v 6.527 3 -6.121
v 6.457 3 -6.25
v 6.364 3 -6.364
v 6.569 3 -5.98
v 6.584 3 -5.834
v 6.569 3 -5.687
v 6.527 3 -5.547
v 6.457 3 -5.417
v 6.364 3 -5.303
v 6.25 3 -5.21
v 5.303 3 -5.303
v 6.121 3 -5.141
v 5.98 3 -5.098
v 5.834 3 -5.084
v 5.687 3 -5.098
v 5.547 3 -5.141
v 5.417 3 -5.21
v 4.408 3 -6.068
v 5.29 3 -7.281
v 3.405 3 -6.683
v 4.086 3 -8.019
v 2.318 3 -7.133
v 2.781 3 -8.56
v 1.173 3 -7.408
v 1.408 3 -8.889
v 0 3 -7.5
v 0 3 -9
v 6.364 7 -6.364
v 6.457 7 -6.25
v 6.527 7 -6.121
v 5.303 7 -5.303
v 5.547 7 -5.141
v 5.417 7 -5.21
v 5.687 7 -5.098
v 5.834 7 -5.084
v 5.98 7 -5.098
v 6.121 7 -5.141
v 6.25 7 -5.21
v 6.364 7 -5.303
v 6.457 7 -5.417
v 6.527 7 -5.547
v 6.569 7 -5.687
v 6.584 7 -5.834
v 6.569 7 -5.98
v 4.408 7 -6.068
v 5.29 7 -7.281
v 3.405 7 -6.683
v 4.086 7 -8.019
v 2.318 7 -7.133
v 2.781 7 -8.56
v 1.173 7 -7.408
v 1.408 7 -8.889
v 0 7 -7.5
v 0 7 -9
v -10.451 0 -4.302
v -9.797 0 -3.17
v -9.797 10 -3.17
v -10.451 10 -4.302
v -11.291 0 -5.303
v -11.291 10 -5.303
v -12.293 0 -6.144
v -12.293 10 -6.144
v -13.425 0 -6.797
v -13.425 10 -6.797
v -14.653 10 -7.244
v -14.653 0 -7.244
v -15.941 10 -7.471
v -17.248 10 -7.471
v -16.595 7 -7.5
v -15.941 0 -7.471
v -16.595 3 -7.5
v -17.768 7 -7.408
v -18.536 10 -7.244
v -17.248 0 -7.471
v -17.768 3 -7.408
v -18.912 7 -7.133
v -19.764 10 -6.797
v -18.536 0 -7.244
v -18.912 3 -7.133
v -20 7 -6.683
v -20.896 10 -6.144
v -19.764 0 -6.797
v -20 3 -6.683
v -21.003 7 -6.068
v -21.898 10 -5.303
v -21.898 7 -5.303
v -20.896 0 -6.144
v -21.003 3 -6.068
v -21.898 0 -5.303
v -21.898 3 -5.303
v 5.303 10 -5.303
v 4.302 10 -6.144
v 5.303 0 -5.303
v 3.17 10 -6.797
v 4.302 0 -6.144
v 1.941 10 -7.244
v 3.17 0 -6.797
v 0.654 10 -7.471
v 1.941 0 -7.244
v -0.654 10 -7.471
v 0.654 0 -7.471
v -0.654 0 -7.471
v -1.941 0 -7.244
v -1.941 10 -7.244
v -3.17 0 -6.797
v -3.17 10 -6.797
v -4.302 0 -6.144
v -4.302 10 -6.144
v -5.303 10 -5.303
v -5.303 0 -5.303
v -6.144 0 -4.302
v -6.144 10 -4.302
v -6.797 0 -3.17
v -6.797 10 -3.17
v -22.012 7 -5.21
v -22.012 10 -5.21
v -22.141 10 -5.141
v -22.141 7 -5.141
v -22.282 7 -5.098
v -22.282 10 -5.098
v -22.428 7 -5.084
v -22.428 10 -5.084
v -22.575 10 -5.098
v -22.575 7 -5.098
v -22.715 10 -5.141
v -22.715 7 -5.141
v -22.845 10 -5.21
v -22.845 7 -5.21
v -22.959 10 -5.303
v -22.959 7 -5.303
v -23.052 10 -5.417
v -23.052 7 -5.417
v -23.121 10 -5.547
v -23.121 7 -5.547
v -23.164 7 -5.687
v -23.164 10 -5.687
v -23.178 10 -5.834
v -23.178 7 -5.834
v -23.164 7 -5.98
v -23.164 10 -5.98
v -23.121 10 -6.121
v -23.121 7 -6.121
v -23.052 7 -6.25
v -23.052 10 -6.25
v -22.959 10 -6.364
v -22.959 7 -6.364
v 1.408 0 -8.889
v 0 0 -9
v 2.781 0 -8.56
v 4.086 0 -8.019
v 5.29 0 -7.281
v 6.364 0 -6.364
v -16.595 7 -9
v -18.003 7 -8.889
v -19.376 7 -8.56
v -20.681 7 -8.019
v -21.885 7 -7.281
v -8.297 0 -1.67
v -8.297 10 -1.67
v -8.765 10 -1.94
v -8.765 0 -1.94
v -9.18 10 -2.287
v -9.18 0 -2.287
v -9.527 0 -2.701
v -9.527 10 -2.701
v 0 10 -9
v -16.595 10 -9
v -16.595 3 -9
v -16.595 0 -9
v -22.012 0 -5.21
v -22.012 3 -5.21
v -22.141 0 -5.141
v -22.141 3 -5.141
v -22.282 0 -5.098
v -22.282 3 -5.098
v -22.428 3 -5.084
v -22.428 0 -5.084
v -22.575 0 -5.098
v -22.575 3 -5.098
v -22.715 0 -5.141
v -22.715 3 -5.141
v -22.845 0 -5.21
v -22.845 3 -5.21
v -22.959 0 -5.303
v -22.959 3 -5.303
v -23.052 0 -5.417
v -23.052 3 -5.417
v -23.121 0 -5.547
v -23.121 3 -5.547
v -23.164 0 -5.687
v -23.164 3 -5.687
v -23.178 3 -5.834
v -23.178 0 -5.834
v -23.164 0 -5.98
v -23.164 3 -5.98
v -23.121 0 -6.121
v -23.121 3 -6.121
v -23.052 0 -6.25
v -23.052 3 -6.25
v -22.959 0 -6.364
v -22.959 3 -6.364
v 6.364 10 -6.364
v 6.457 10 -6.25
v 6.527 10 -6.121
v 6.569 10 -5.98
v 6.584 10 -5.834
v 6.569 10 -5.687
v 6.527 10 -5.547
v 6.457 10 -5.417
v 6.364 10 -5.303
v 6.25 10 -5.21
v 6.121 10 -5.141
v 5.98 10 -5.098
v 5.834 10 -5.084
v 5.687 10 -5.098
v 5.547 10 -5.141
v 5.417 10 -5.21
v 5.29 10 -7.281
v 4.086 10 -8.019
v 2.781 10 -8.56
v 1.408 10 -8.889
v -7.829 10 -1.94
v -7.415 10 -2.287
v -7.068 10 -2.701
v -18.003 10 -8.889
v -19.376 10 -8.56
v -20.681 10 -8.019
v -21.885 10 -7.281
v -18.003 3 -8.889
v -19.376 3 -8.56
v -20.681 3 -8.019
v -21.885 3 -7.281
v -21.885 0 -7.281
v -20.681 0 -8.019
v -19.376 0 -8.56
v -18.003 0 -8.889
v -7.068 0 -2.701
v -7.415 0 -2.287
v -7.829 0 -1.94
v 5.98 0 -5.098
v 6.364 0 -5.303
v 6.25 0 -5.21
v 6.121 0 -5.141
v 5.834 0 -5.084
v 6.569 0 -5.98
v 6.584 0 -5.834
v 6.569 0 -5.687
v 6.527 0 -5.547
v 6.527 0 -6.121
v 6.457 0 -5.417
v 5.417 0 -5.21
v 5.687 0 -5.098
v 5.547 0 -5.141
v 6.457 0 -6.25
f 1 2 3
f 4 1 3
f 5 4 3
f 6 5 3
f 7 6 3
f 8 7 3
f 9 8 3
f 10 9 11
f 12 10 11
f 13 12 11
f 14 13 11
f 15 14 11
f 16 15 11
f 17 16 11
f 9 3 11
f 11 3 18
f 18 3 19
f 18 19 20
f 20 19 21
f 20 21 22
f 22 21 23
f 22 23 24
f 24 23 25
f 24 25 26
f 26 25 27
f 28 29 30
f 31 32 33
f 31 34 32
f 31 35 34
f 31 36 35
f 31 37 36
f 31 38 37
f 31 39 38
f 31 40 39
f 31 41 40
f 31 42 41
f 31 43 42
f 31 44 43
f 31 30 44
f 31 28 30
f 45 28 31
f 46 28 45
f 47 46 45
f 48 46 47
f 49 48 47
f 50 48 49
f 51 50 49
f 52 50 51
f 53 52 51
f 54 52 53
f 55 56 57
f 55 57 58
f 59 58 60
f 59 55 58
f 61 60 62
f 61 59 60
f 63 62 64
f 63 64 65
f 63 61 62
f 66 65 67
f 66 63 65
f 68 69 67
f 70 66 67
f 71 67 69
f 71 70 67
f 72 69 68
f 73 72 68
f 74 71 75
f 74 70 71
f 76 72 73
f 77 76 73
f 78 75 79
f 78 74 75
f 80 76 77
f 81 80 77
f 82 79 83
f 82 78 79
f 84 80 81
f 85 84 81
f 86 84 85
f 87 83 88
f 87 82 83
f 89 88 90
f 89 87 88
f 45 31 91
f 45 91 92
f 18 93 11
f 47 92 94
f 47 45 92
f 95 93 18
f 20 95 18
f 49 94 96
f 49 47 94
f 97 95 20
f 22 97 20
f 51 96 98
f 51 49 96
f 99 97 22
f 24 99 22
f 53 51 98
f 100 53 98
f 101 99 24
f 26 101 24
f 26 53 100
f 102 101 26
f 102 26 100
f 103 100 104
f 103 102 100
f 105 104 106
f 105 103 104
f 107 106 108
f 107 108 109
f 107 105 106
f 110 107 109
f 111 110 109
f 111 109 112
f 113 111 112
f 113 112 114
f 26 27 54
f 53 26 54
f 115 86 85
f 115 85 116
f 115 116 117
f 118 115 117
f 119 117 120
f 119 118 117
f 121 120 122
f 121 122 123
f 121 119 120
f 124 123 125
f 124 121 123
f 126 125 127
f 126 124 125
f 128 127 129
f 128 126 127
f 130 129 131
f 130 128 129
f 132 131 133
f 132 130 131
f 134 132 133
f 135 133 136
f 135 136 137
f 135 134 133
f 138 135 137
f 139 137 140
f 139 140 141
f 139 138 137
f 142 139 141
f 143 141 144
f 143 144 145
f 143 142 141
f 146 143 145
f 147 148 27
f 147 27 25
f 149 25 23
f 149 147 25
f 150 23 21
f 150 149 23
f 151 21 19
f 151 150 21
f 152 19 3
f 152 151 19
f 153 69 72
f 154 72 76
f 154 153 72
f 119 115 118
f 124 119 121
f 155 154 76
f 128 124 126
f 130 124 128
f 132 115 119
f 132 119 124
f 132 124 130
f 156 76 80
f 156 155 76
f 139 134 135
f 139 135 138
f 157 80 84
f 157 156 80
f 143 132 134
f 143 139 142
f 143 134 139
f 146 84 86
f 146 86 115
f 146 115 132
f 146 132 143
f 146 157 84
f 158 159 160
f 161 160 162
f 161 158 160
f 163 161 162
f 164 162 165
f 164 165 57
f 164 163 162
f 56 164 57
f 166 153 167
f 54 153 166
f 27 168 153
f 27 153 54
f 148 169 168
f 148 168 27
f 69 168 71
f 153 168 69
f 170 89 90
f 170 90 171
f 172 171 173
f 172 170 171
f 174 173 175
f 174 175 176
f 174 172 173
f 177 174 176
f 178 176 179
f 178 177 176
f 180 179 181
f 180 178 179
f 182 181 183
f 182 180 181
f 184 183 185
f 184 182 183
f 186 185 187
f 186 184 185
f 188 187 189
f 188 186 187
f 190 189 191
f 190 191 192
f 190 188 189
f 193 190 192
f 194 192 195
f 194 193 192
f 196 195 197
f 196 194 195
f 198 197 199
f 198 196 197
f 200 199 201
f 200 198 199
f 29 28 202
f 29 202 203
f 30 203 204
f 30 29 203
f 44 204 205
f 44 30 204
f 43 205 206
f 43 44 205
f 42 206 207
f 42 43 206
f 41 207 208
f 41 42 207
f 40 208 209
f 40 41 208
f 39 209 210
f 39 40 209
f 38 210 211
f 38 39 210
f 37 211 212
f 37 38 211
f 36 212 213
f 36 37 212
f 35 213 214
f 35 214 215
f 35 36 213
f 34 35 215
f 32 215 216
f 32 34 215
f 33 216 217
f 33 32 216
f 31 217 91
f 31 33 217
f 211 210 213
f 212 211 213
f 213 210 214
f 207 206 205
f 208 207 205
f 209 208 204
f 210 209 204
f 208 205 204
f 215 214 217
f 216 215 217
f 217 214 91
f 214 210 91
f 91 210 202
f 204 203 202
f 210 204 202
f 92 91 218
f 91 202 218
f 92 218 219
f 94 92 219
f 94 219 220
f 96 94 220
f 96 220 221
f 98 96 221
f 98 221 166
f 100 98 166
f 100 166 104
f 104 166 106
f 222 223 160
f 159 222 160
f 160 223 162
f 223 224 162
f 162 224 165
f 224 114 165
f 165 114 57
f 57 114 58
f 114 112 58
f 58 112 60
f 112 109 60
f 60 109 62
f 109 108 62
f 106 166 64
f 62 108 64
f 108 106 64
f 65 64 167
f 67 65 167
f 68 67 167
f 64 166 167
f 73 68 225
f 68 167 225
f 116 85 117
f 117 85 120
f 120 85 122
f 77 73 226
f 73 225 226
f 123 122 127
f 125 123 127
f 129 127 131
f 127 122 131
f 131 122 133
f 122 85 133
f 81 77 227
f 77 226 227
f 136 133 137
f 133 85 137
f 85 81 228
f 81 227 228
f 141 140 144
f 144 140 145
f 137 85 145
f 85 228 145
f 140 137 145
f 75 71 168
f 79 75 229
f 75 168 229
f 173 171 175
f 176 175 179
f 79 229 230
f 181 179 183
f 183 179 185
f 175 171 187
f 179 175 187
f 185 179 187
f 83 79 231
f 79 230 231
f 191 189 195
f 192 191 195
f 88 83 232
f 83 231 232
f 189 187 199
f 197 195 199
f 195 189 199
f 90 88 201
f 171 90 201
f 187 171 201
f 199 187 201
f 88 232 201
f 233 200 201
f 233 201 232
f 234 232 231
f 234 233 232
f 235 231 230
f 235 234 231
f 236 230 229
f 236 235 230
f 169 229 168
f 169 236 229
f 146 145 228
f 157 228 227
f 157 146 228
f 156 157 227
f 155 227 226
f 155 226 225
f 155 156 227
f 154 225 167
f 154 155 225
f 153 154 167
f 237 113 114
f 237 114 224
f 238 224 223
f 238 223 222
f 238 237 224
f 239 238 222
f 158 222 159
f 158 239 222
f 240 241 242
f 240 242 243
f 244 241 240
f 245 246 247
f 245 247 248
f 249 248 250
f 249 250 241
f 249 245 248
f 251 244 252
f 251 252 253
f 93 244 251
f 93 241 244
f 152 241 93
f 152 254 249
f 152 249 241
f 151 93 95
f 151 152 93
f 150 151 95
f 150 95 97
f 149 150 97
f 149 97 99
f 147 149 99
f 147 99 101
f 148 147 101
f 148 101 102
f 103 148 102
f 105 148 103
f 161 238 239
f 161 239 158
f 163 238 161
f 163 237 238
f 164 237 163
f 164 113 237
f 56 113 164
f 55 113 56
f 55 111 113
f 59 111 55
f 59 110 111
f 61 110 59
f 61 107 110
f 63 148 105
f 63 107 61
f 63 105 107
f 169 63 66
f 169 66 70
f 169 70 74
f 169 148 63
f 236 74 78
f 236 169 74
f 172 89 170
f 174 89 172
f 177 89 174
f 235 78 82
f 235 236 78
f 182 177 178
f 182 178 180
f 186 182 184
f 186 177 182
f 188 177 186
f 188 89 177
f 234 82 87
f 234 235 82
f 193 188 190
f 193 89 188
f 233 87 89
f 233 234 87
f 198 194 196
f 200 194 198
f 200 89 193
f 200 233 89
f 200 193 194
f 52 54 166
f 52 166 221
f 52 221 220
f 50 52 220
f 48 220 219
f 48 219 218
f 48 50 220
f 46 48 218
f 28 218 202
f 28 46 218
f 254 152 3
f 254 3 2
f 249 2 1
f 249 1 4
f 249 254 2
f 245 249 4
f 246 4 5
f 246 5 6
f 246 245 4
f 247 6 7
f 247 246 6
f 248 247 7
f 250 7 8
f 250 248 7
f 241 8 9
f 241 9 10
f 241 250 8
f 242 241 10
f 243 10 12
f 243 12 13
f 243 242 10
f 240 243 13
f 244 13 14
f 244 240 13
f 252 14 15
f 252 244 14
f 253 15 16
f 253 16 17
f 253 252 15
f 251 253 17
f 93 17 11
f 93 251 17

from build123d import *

# Parameters (mm, degrees)
BOSS_EXTRUDE2_DEPTH = 10
SKETCH2_W           = 6.583630945
SKETCH2_H           = 4
SKETCH2_W_2         = 6.583630944
CUT_EXTRUDE1_DEPTH  = 20


with BuildPart() as part:
    # Sketch1 → Boss-Extrude2 (new body)
    with BuildSketch(Plane(origin=(0, 0, 0), x_dir=(1, 0, 0), z_dir=(0, 1, 0))):
        with BuildLine():
            ThreePointArc((-9.797308403, 3.169636963), (-15.292255473, 7.386058148), (-21.897917664, 5.303300859))
            ThreePointArc((-21.897917664, 5.303300859), (-22.958577836, 5.303300859), (-22.958577836, 6.363961031))
            ThreePointArc((-22.958577836, 6.363961031), (-20.038767697, 8.314915793), (-16.594616806, 9))
            Line((-16.594616806, 9), (0, 9))
            ThreePointArc((0, 9), (3.444150891, 8.314915793), (6.363961031, 6.363961031))
            ThreePointArc((6.363961031, 6.363961031), (6.363961031, 5.303300859), (5.303300859, 5.303300859))
            ThreePointArc((5.303300859, 5.303300859), (-1.302361333, 7.386058148), (-6.797308403, 3.169636963))
            ThreePointArc((-6.797308403, 3.169636963), (-7.415063167, 2.287391728), (-8.297308403, 1.669636963))
            ThreePointArc((-8.297308403, 1.669636963), (-9.179553638, 2.287391728), (-9.797308403, 3.169636963))
        make_face()
    extrude(amount=BOSS_EXTRUDE2_DEPTH)

    # Sketch2 → Cut-Extrude1 (cut)
    with BuildSketch(Plane(origin=(0, 0, -9), x_dir=(-1, 0, 0), z_dir=(0, 0, -1))):
        with Locations((-3.291815473, 5)):
            Rectangle(SKETCH2_W, SKETCH2_H)
        with Locations((19.886432278, 5)):
            Rectangle(SKETCH2_W_2, SKETCH2_H)
    extrude(amount=-CUT_EXTRUDE1_DEPTH, mode=Mode.SUBTRACT)


solid = part.part
